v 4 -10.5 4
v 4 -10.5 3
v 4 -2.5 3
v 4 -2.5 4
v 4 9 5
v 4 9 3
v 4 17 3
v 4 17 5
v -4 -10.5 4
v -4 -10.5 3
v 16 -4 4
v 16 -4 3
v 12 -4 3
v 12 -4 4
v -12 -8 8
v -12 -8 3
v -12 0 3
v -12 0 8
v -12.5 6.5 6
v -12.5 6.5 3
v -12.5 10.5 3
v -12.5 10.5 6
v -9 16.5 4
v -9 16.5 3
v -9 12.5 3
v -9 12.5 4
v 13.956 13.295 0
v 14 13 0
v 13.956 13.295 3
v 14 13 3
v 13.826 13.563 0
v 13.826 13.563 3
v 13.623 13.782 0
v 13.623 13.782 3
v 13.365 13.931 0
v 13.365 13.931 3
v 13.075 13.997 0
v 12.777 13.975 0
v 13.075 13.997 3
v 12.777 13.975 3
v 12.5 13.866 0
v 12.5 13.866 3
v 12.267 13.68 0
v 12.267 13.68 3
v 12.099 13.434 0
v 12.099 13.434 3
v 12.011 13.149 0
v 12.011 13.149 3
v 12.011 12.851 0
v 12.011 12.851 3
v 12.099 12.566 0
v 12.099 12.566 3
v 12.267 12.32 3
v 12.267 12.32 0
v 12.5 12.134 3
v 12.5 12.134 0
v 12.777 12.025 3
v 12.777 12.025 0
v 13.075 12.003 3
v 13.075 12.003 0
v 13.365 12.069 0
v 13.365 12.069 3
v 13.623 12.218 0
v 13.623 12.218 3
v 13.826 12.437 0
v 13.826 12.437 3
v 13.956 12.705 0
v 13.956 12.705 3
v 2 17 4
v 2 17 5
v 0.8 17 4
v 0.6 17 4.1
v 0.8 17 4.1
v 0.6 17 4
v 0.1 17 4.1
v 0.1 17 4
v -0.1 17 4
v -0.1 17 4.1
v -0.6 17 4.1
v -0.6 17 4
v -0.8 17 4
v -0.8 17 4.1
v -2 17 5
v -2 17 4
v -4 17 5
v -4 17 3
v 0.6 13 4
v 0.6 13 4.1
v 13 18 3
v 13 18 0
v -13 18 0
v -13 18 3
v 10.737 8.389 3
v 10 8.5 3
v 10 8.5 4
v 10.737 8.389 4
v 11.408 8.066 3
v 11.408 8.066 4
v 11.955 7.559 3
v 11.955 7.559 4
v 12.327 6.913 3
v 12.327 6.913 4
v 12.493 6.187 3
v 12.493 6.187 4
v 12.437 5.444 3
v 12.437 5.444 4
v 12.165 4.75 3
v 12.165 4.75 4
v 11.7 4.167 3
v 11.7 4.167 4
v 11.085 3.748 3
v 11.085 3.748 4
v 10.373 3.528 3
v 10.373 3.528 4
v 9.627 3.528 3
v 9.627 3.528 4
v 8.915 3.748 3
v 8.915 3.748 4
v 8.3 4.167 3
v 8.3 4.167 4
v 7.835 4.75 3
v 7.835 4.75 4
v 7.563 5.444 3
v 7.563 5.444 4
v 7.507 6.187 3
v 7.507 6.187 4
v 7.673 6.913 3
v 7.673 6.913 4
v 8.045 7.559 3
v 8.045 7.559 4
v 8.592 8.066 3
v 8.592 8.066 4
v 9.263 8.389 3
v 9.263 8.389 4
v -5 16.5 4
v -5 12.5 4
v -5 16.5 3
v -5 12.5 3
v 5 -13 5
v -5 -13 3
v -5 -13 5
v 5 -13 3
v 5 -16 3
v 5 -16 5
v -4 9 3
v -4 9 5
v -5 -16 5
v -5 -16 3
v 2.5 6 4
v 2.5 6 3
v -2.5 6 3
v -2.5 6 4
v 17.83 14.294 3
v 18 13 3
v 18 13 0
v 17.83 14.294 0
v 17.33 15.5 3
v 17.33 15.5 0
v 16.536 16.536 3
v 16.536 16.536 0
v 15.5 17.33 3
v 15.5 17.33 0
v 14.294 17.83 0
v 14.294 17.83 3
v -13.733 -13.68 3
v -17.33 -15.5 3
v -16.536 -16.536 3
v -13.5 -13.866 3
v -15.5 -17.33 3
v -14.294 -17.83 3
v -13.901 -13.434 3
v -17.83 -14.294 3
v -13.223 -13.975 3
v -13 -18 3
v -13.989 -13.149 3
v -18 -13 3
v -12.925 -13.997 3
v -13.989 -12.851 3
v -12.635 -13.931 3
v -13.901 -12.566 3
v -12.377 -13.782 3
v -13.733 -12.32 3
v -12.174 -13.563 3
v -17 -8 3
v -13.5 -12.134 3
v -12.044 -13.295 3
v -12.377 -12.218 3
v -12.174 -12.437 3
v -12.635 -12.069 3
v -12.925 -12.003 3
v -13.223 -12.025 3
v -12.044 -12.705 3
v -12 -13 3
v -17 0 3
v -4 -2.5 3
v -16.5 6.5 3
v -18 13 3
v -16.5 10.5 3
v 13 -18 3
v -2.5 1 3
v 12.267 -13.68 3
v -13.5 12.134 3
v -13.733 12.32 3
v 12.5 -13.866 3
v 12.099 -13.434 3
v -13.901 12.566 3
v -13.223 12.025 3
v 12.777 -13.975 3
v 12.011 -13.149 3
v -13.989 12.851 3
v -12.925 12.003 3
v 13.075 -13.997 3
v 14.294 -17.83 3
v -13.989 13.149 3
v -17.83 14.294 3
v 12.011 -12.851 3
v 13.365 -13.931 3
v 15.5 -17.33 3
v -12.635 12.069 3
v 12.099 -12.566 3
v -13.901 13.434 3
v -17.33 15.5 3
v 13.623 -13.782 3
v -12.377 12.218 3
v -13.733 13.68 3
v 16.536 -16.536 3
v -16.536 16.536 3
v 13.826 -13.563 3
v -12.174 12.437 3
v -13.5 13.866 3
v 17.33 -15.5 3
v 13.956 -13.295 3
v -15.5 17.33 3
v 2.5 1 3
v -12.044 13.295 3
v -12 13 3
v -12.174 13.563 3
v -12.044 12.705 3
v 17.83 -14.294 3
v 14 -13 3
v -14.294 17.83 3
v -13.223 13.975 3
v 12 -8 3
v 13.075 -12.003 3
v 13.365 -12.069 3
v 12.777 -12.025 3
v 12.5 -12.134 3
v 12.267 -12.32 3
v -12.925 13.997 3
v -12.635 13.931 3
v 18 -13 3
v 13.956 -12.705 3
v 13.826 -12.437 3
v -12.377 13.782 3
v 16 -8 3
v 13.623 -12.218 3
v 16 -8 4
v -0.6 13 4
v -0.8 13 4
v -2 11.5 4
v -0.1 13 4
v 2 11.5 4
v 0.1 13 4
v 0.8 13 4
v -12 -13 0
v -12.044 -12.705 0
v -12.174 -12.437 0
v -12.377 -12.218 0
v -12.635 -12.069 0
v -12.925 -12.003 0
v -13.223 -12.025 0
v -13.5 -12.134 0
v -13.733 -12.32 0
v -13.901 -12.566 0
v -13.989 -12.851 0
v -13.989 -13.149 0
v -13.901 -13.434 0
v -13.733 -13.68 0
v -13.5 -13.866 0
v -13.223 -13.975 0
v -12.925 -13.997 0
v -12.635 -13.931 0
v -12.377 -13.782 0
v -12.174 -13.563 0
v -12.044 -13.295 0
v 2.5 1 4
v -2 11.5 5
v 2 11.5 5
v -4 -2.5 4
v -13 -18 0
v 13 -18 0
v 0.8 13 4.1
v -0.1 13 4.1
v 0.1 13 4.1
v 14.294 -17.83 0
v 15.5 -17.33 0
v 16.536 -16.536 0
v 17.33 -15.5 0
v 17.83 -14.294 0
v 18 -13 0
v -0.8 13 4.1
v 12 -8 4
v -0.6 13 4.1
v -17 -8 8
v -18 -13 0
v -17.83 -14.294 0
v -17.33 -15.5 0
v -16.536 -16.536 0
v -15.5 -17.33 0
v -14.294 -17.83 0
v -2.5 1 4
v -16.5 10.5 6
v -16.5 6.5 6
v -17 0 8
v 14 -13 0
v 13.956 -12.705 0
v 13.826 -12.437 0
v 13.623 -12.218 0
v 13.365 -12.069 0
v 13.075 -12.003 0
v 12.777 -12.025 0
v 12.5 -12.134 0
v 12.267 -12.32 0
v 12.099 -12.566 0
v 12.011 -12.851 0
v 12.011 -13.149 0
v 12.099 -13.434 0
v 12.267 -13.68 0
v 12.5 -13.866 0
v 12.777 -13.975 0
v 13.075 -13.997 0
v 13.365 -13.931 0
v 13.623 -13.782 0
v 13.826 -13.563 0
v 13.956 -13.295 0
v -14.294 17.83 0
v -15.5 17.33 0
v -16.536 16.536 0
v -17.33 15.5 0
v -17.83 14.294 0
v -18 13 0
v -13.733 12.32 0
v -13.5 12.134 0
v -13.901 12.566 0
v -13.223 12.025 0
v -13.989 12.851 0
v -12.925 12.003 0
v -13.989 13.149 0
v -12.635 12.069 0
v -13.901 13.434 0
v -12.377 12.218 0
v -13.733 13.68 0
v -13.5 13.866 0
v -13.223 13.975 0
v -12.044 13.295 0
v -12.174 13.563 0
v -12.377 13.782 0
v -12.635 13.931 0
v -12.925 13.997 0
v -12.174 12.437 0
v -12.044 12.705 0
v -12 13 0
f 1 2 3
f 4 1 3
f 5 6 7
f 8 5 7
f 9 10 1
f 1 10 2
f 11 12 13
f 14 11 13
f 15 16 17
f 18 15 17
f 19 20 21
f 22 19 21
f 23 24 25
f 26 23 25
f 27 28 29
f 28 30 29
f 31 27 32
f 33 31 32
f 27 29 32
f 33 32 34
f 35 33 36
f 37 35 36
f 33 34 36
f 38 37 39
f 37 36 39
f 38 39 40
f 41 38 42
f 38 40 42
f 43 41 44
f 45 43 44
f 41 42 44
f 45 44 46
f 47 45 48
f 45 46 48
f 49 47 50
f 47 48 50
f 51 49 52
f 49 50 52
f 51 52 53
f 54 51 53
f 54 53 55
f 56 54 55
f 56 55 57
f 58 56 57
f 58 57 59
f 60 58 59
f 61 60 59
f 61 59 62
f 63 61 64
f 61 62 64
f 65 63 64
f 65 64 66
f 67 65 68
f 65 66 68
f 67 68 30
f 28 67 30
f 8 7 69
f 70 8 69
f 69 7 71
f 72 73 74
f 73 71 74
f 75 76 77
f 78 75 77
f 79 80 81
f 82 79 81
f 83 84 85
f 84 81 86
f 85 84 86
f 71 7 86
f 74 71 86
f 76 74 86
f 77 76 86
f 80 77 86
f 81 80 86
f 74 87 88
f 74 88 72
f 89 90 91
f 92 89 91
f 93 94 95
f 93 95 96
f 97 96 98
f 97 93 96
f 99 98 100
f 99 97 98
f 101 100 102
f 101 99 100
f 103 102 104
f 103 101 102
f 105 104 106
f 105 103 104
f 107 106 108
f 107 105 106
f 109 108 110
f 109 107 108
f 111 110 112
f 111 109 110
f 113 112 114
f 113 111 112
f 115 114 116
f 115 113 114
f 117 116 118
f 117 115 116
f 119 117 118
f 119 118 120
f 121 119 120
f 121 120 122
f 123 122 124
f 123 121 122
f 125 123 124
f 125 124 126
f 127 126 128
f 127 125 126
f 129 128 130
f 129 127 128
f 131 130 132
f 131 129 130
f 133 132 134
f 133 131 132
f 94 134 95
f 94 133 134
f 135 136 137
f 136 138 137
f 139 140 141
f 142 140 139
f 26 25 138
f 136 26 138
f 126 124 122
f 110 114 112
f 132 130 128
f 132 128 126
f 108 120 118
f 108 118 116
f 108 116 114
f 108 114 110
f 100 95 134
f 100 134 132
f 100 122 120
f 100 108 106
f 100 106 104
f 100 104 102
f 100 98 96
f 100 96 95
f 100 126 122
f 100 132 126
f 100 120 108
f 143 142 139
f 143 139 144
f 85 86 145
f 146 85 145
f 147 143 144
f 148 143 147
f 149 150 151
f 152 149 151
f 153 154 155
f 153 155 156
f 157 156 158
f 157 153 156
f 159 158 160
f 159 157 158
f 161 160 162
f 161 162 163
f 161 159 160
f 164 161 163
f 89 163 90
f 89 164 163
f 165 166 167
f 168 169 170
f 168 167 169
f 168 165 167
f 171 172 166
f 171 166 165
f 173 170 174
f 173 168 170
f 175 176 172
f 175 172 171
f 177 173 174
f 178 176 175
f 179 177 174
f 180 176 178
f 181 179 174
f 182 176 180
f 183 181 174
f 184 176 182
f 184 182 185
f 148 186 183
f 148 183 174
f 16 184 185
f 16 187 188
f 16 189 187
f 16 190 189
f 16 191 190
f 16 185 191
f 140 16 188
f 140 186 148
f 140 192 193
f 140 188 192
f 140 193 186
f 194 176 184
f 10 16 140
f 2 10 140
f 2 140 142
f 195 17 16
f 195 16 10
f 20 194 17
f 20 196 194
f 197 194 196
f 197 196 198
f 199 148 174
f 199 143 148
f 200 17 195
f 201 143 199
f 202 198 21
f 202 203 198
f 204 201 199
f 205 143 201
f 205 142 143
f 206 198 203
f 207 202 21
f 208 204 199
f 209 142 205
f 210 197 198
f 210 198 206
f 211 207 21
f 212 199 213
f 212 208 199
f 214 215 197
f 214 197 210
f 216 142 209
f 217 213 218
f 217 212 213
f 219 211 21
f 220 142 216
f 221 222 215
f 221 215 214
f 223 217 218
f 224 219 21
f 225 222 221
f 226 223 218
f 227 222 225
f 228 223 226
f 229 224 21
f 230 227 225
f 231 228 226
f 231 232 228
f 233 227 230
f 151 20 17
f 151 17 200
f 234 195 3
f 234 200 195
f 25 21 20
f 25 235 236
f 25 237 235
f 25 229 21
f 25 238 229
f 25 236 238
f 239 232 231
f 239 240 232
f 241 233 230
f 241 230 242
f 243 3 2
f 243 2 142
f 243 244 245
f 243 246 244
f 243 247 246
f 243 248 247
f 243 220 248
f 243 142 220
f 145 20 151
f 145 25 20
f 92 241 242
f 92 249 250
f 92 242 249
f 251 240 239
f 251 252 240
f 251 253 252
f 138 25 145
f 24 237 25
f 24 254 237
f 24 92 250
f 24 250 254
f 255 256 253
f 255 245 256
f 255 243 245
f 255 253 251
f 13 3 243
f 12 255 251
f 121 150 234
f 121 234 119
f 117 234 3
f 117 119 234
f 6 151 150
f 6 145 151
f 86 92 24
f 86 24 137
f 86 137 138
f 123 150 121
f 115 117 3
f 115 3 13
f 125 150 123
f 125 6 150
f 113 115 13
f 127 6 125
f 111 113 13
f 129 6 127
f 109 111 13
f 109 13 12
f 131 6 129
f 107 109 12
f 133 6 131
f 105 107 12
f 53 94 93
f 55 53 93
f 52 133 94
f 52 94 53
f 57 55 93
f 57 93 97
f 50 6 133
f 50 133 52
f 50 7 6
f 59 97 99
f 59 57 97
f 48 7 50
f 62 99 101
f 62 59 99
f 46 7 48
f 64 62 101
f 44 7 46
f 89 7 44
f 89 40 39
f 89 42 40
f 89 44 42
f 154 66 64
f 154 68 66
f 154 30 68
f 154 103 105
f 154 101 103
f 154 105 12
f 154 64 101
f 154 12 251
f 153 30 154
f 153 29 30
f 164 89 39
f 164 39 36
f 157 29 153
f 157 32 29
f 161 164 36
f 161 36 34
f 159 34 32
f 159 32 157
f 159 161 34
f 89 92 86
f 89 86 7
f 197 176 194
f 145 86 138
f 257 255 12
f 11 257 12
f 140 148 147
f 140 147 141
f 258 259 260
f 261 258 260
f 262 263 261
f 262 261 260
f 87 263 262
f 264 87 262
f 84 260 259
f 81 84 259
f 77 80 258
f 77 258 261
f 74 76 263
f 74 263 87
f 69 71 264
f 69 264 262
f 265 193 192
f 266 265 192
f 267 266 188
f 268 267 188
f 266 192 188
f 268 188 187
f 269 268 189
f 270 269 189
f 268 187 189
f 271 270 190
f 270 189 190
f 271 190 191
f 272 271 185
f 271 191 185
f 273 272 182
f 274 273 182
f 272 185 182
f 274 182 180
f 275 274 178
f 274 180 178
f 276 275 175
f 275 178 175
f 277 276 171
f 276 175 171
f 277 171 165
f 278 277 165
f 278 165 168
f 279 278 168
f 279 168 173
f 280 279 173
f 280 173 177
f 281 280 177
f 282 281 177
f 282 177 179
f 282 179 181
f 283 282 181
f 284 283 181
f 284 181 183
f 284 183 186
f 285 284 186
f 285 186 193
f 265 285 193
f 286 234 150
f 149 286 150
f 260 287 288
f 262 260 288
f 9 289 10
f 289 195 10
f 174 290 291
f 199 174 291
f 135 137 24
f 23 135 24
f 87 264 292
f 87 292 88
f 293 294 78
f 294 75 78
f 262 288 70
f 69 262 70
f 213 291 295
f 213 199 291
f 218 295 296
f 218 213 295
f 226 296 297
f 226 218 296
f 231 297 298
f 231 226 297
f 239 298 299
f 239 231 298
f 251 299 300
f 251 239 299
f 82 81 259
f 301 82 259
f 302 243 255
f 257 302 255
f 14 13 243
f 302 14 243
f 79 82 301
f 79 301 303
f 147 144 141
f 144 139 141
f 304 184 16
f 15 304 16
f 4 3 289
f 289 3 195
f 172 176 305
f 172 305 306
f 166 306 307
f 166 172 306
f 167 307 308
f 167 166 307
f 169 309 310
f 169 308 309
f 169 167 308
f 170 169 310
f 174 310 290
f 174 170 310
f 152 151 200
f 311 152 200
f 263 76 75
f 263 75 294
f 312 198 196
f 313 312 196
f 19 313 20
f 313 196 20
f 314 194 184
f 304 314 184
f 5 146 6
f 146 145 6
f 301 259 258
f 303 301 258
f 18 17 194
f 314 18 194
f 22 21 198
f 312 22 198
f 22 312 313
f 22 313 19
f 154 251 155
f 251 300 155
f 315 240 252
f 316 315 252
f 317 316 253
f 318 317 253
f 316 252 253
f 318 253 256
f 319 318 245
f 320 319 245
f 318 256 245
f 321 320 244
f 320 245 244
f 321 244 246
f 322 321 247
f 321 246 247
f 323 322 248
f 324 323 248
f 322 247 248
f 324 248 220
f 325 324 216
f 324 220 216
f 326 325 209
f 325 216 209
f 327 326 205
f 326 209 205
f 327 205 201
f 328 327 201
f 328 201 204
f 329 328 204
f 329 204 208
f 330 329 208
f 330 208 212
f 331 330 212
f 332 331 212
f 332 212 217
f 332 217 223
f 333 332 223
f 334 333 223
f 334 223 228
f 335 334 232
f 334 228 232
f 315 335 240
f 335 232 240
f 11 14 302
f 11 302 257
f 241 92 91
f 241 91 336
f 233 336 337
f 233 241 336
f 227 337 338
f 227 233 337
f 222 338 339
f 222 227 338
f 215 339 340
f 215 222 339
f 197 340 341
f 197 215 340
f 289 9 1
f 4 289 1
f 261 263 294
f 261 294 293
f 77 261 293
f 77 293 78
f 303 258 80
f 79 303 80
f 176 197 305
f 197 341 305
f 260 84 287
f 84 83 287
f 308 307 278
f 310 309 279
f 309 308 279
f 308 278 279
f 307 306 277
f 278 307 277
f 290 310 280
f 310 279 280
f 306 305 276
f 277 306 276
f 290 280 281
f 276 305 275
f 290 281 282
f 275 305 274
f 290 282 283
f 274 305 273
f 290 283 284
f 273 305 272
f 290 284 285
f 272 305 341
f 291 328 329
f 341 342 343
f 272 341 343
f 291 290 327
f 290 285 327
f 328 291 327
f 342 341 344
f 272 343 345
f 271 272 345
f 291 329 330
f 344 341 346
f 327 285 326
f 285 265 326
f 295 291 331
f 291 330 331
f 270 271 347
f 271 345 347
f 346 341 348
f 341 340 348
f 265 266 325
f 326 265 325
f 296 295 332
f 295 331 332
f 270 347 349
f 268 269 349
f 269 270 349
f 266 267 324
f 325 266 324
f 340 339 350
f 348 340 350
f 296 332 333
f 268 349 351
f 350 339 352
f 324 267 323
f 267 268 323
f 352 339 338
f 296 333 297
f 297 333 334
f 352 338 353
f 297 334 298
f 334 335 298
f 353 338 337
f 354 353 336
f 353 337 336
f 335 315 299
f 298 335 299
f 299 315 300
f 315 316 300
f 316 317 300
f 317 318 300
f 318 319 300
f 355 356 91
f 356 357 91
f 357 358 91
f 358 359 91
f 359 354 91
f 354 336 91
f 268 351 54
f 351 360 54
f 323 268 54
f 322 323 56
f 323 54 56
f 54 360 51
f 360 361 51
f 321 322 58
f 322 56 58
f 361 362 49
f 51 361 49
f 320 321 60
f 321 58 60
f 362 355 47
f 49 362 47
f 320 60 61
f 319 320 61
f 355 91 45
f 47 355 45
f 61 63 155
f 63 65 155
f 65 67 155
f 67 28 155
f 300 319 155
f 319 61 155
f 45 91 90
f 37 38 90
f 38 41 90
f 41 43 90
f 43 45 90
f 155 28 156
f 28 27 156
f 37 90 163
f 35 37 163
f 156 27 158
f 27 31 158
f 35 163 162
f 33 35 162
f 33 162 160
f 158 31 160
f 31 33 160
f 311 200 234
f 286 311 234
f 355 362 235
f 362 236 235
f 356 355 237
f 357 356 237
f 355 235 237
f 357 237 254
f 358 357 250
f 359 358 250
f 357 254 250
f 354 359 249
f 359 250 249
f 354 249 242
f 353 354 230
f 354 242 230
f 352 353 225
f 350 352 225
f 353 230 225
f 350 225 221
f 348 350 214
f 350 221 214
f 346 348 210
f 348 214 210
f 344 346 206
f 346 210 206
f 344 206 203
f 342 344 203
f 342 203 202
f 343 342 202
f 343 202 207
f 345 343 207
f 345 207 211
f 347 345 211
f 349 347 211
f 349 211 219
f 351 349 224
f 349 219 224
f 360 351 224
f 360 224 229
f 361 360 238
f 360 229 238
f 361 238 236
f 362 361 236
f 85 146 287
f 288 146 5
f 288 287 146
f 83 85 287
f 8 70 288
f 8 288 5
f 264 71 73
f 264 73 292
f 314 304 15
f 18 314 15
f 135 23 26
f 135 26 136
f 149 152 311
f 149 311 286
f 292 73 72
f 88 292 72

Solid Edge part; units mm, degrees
sketch "Sketch1" plane through (0, 0, 0) normal (0, 0, 1) x (1, 0, 0)
  line L0 (-18, -18) -> (18, -18)
  line L1 (18, -18) -> (18, 18)
  line L2 (18, 18) -> (-18, 18)
  line L3 (-18, 18) -> (-18, -18)
  dimension "D1" = 36
extrude "Protrusion1" add sketch "Sketch1" along normal blind 3
sketch "Sketch2" plane through (0, 0, 3) normal (0, 0, 1) x (1, 0, 0)
  circle A0 centre (13, 13) radius 1
  circle A1 centre (13, -13) radius 1
  circle A2 centre (-13, -13) radius 1
  circle A3 centre (-13, 13) radius 1
  dimension "D1" = 2
extrude "Cutout1" cut sketch "Sketch2" against normal up to next
sketch "Sketch3" plane through (0, 0, 3) normal (0, 0, 1) x (0, 1, 0)
  line L0 (-8, 12) -> (0, 12)
  line L1 (0, 12) -> (0, 17)
  line L2 (0, 17) -> (-8, 17)
  line L3 (-8, 17) -> (-8, 12)
extrude "Collegamento_cavi" add sketch "Sketch3" along normal blind 5
sketch "Sketch4" plane through (0, 0, 3) normal (0, 0, 1) x (0, 1, 0)
  line L0 (6.5, 12.5) -> (10.5, 12.5)
  line L1 (10.5, 12.5) -> (10.5, 16.5)
  line L2 (10.5, 16.5) -> (6.5, 16.5)
  line L3 (6.5, 16.5) -> (6.5, 12.5)
extrude "Collegamento_secondario" add sketch "Sketch4" along normal blind 3
sketch "Sketch5" plane through (0, 0, 3) normal (0, 0, 1) x (0, 1, 0)
  line L0 (-2.5, 4) -> (-10.5, 4)
  line L1 (-10.5, 4) -> (-10.5, -4)
  line L2 (-10.5, -4) -> (-2.5, -4)
  line L3 (-2.5, -4) -> (-2.5, 4)
extrude "Scheda" add sketch "Sketch5" along normal blind 1
sketch "Sketch6" plane through (0, 0, 3) normal (0, 0, 1) x (0, 1, 0)
  line L0 (1, 2.5) -> (1, -2.5)
  line L1 (1, -2.5) -> (6, -2.5)
  line L2 (6, -2.5) -> (6, 2.5)
  line L3 (6, 2.5) -> (1, 2.5)
extrude "Schedina" add sketch "Sketch6" along normal blind 1
sketch "Sketch7" plane through (0, 0, 3) normal (0, 0, 1) x (0, 1, 0)
  circle A0 centre (6, -10) radius 2.5
extrude "Protrusione_circolare" add sketch "Sketch7" along normal blind 1
sketch "Sketch8" plane through (0, 0, 3) normal (0, 0, 1) x (0, 1, 0)
  line L0 (9, -4) -> (17, -4)
  line L1 (17, -4) -> (17, 4)
  line L2 (17, 4) -> (9, 4)
  line L3 (9, 4) -> (9, -4)
extrude "Collegamento_Camera" add sketch "Sketch8" along normal blind 2
sketch "Sketch9" plane through (0, 0, 3) normal (0, 0, 1) x (0, 1, 0)
  line L0 (-4, -16) -> (-4, -12)
  line L1 (-4, -12) -> (-8, -12)
  line L2 (-8, -12) -> (-8, -16)
  line L3 (-8, -16) -> (-4, -16)
extrude "Scheda_laterale" add sketch "Sketch9" along normal blind 1
sketch "Sketch10" plane through (0, 0, 3) normal (0, 0, 1) x (0, 1, 0)
  line L0 (16.5, 9) -> (12.5, 9)
  line L1 (12.5, 9) -> (12.5, 5)
  line L2 (12.5, 5) -> (16.5, 5)
  line L3 (16.5, 5) -> (16.5, 9)
extrude "Scheda_posteriore" add sketch "Sketch10" along normal blind 1
fillet "Rotondo_1" radius 5 4 edges at (18, -18, 1.5) (18, 18, 1.5) (-18, -18, 1.5) (-18, 18, 1.5)
sketch "Sketch11" plane through (0, 13, 5) normal (0, 0, 1) x (-1, 0, 0)
  line L0 (-2, -4) -> (2, -4)
  line L1 (2, -4) -> (2, 1.5)
  line L2 (2, 1.5) -> (-2, 1.5)
  line L3 (-2, 1.5) -> (-2, -4)
  dimension "D1" = 5.5
  dimension "D2" = 4
extrude "Alloggio_cavi_Camera" cut sketch "Sketch11" against normal blind 1
sketch "Sketch12" plane through (0, 0, 3) normal (0, 0, 1) x (-1, 0, 0)
  line L0 (5, 13) -> (-5, 13)
  line L1 (-5, 13) -> (-5, 16)
  line L2 (-5, 16) -> (5, 16)
  line L3 (5, 16) -> (5, 13)
extrude "ProtrusioneEstrusa_12" add sketch "Sketch12" along normal blind 2
sketch "Sketch13" plane through (0, 14.25, 4) normal (0, 0, 1) x (-1, 0, 0)
  line L0 (-0.8, -2.75) -> (-0.8, 1.25)
  line L1 (-0.8, 1.25) -> (-0.6, 1.25)
  line L2 (-0.6, 1.25) -> (-0.6, -2.75)
  line L3 (-0.6, -2.75) -> (-0.8, -2.75)
  line L4 (0.1, 1.25) -> (0.1, -2.75)
  line L5 (0.1, -2.75) -> (-0.1, -2.75)
  line L6 (-0.1, -2.75) -> (-0.1, 1.25)
  line L7 (-0.1, 1.25) -> (0.1, 1.25)
  line L8 (0.8, -2.75) -> (0.8, 1.25)
  line L9 (0.8, 1.25) -> (0.6, 1.25)
  line L10 (0.6, 1.25) -> (0.6, -2.75)
  line L11 (0.6, -2.75) -> (0.8, -2.75)
  dimension "D1" = 0.2
  dimension "D2" = 4
  dimension "D3" = 0.5
  dimension "D4" = 0.5
extrude "ProtrusioneEstrusa_13" add sketch "Sketch13" along normal blind 0.1
